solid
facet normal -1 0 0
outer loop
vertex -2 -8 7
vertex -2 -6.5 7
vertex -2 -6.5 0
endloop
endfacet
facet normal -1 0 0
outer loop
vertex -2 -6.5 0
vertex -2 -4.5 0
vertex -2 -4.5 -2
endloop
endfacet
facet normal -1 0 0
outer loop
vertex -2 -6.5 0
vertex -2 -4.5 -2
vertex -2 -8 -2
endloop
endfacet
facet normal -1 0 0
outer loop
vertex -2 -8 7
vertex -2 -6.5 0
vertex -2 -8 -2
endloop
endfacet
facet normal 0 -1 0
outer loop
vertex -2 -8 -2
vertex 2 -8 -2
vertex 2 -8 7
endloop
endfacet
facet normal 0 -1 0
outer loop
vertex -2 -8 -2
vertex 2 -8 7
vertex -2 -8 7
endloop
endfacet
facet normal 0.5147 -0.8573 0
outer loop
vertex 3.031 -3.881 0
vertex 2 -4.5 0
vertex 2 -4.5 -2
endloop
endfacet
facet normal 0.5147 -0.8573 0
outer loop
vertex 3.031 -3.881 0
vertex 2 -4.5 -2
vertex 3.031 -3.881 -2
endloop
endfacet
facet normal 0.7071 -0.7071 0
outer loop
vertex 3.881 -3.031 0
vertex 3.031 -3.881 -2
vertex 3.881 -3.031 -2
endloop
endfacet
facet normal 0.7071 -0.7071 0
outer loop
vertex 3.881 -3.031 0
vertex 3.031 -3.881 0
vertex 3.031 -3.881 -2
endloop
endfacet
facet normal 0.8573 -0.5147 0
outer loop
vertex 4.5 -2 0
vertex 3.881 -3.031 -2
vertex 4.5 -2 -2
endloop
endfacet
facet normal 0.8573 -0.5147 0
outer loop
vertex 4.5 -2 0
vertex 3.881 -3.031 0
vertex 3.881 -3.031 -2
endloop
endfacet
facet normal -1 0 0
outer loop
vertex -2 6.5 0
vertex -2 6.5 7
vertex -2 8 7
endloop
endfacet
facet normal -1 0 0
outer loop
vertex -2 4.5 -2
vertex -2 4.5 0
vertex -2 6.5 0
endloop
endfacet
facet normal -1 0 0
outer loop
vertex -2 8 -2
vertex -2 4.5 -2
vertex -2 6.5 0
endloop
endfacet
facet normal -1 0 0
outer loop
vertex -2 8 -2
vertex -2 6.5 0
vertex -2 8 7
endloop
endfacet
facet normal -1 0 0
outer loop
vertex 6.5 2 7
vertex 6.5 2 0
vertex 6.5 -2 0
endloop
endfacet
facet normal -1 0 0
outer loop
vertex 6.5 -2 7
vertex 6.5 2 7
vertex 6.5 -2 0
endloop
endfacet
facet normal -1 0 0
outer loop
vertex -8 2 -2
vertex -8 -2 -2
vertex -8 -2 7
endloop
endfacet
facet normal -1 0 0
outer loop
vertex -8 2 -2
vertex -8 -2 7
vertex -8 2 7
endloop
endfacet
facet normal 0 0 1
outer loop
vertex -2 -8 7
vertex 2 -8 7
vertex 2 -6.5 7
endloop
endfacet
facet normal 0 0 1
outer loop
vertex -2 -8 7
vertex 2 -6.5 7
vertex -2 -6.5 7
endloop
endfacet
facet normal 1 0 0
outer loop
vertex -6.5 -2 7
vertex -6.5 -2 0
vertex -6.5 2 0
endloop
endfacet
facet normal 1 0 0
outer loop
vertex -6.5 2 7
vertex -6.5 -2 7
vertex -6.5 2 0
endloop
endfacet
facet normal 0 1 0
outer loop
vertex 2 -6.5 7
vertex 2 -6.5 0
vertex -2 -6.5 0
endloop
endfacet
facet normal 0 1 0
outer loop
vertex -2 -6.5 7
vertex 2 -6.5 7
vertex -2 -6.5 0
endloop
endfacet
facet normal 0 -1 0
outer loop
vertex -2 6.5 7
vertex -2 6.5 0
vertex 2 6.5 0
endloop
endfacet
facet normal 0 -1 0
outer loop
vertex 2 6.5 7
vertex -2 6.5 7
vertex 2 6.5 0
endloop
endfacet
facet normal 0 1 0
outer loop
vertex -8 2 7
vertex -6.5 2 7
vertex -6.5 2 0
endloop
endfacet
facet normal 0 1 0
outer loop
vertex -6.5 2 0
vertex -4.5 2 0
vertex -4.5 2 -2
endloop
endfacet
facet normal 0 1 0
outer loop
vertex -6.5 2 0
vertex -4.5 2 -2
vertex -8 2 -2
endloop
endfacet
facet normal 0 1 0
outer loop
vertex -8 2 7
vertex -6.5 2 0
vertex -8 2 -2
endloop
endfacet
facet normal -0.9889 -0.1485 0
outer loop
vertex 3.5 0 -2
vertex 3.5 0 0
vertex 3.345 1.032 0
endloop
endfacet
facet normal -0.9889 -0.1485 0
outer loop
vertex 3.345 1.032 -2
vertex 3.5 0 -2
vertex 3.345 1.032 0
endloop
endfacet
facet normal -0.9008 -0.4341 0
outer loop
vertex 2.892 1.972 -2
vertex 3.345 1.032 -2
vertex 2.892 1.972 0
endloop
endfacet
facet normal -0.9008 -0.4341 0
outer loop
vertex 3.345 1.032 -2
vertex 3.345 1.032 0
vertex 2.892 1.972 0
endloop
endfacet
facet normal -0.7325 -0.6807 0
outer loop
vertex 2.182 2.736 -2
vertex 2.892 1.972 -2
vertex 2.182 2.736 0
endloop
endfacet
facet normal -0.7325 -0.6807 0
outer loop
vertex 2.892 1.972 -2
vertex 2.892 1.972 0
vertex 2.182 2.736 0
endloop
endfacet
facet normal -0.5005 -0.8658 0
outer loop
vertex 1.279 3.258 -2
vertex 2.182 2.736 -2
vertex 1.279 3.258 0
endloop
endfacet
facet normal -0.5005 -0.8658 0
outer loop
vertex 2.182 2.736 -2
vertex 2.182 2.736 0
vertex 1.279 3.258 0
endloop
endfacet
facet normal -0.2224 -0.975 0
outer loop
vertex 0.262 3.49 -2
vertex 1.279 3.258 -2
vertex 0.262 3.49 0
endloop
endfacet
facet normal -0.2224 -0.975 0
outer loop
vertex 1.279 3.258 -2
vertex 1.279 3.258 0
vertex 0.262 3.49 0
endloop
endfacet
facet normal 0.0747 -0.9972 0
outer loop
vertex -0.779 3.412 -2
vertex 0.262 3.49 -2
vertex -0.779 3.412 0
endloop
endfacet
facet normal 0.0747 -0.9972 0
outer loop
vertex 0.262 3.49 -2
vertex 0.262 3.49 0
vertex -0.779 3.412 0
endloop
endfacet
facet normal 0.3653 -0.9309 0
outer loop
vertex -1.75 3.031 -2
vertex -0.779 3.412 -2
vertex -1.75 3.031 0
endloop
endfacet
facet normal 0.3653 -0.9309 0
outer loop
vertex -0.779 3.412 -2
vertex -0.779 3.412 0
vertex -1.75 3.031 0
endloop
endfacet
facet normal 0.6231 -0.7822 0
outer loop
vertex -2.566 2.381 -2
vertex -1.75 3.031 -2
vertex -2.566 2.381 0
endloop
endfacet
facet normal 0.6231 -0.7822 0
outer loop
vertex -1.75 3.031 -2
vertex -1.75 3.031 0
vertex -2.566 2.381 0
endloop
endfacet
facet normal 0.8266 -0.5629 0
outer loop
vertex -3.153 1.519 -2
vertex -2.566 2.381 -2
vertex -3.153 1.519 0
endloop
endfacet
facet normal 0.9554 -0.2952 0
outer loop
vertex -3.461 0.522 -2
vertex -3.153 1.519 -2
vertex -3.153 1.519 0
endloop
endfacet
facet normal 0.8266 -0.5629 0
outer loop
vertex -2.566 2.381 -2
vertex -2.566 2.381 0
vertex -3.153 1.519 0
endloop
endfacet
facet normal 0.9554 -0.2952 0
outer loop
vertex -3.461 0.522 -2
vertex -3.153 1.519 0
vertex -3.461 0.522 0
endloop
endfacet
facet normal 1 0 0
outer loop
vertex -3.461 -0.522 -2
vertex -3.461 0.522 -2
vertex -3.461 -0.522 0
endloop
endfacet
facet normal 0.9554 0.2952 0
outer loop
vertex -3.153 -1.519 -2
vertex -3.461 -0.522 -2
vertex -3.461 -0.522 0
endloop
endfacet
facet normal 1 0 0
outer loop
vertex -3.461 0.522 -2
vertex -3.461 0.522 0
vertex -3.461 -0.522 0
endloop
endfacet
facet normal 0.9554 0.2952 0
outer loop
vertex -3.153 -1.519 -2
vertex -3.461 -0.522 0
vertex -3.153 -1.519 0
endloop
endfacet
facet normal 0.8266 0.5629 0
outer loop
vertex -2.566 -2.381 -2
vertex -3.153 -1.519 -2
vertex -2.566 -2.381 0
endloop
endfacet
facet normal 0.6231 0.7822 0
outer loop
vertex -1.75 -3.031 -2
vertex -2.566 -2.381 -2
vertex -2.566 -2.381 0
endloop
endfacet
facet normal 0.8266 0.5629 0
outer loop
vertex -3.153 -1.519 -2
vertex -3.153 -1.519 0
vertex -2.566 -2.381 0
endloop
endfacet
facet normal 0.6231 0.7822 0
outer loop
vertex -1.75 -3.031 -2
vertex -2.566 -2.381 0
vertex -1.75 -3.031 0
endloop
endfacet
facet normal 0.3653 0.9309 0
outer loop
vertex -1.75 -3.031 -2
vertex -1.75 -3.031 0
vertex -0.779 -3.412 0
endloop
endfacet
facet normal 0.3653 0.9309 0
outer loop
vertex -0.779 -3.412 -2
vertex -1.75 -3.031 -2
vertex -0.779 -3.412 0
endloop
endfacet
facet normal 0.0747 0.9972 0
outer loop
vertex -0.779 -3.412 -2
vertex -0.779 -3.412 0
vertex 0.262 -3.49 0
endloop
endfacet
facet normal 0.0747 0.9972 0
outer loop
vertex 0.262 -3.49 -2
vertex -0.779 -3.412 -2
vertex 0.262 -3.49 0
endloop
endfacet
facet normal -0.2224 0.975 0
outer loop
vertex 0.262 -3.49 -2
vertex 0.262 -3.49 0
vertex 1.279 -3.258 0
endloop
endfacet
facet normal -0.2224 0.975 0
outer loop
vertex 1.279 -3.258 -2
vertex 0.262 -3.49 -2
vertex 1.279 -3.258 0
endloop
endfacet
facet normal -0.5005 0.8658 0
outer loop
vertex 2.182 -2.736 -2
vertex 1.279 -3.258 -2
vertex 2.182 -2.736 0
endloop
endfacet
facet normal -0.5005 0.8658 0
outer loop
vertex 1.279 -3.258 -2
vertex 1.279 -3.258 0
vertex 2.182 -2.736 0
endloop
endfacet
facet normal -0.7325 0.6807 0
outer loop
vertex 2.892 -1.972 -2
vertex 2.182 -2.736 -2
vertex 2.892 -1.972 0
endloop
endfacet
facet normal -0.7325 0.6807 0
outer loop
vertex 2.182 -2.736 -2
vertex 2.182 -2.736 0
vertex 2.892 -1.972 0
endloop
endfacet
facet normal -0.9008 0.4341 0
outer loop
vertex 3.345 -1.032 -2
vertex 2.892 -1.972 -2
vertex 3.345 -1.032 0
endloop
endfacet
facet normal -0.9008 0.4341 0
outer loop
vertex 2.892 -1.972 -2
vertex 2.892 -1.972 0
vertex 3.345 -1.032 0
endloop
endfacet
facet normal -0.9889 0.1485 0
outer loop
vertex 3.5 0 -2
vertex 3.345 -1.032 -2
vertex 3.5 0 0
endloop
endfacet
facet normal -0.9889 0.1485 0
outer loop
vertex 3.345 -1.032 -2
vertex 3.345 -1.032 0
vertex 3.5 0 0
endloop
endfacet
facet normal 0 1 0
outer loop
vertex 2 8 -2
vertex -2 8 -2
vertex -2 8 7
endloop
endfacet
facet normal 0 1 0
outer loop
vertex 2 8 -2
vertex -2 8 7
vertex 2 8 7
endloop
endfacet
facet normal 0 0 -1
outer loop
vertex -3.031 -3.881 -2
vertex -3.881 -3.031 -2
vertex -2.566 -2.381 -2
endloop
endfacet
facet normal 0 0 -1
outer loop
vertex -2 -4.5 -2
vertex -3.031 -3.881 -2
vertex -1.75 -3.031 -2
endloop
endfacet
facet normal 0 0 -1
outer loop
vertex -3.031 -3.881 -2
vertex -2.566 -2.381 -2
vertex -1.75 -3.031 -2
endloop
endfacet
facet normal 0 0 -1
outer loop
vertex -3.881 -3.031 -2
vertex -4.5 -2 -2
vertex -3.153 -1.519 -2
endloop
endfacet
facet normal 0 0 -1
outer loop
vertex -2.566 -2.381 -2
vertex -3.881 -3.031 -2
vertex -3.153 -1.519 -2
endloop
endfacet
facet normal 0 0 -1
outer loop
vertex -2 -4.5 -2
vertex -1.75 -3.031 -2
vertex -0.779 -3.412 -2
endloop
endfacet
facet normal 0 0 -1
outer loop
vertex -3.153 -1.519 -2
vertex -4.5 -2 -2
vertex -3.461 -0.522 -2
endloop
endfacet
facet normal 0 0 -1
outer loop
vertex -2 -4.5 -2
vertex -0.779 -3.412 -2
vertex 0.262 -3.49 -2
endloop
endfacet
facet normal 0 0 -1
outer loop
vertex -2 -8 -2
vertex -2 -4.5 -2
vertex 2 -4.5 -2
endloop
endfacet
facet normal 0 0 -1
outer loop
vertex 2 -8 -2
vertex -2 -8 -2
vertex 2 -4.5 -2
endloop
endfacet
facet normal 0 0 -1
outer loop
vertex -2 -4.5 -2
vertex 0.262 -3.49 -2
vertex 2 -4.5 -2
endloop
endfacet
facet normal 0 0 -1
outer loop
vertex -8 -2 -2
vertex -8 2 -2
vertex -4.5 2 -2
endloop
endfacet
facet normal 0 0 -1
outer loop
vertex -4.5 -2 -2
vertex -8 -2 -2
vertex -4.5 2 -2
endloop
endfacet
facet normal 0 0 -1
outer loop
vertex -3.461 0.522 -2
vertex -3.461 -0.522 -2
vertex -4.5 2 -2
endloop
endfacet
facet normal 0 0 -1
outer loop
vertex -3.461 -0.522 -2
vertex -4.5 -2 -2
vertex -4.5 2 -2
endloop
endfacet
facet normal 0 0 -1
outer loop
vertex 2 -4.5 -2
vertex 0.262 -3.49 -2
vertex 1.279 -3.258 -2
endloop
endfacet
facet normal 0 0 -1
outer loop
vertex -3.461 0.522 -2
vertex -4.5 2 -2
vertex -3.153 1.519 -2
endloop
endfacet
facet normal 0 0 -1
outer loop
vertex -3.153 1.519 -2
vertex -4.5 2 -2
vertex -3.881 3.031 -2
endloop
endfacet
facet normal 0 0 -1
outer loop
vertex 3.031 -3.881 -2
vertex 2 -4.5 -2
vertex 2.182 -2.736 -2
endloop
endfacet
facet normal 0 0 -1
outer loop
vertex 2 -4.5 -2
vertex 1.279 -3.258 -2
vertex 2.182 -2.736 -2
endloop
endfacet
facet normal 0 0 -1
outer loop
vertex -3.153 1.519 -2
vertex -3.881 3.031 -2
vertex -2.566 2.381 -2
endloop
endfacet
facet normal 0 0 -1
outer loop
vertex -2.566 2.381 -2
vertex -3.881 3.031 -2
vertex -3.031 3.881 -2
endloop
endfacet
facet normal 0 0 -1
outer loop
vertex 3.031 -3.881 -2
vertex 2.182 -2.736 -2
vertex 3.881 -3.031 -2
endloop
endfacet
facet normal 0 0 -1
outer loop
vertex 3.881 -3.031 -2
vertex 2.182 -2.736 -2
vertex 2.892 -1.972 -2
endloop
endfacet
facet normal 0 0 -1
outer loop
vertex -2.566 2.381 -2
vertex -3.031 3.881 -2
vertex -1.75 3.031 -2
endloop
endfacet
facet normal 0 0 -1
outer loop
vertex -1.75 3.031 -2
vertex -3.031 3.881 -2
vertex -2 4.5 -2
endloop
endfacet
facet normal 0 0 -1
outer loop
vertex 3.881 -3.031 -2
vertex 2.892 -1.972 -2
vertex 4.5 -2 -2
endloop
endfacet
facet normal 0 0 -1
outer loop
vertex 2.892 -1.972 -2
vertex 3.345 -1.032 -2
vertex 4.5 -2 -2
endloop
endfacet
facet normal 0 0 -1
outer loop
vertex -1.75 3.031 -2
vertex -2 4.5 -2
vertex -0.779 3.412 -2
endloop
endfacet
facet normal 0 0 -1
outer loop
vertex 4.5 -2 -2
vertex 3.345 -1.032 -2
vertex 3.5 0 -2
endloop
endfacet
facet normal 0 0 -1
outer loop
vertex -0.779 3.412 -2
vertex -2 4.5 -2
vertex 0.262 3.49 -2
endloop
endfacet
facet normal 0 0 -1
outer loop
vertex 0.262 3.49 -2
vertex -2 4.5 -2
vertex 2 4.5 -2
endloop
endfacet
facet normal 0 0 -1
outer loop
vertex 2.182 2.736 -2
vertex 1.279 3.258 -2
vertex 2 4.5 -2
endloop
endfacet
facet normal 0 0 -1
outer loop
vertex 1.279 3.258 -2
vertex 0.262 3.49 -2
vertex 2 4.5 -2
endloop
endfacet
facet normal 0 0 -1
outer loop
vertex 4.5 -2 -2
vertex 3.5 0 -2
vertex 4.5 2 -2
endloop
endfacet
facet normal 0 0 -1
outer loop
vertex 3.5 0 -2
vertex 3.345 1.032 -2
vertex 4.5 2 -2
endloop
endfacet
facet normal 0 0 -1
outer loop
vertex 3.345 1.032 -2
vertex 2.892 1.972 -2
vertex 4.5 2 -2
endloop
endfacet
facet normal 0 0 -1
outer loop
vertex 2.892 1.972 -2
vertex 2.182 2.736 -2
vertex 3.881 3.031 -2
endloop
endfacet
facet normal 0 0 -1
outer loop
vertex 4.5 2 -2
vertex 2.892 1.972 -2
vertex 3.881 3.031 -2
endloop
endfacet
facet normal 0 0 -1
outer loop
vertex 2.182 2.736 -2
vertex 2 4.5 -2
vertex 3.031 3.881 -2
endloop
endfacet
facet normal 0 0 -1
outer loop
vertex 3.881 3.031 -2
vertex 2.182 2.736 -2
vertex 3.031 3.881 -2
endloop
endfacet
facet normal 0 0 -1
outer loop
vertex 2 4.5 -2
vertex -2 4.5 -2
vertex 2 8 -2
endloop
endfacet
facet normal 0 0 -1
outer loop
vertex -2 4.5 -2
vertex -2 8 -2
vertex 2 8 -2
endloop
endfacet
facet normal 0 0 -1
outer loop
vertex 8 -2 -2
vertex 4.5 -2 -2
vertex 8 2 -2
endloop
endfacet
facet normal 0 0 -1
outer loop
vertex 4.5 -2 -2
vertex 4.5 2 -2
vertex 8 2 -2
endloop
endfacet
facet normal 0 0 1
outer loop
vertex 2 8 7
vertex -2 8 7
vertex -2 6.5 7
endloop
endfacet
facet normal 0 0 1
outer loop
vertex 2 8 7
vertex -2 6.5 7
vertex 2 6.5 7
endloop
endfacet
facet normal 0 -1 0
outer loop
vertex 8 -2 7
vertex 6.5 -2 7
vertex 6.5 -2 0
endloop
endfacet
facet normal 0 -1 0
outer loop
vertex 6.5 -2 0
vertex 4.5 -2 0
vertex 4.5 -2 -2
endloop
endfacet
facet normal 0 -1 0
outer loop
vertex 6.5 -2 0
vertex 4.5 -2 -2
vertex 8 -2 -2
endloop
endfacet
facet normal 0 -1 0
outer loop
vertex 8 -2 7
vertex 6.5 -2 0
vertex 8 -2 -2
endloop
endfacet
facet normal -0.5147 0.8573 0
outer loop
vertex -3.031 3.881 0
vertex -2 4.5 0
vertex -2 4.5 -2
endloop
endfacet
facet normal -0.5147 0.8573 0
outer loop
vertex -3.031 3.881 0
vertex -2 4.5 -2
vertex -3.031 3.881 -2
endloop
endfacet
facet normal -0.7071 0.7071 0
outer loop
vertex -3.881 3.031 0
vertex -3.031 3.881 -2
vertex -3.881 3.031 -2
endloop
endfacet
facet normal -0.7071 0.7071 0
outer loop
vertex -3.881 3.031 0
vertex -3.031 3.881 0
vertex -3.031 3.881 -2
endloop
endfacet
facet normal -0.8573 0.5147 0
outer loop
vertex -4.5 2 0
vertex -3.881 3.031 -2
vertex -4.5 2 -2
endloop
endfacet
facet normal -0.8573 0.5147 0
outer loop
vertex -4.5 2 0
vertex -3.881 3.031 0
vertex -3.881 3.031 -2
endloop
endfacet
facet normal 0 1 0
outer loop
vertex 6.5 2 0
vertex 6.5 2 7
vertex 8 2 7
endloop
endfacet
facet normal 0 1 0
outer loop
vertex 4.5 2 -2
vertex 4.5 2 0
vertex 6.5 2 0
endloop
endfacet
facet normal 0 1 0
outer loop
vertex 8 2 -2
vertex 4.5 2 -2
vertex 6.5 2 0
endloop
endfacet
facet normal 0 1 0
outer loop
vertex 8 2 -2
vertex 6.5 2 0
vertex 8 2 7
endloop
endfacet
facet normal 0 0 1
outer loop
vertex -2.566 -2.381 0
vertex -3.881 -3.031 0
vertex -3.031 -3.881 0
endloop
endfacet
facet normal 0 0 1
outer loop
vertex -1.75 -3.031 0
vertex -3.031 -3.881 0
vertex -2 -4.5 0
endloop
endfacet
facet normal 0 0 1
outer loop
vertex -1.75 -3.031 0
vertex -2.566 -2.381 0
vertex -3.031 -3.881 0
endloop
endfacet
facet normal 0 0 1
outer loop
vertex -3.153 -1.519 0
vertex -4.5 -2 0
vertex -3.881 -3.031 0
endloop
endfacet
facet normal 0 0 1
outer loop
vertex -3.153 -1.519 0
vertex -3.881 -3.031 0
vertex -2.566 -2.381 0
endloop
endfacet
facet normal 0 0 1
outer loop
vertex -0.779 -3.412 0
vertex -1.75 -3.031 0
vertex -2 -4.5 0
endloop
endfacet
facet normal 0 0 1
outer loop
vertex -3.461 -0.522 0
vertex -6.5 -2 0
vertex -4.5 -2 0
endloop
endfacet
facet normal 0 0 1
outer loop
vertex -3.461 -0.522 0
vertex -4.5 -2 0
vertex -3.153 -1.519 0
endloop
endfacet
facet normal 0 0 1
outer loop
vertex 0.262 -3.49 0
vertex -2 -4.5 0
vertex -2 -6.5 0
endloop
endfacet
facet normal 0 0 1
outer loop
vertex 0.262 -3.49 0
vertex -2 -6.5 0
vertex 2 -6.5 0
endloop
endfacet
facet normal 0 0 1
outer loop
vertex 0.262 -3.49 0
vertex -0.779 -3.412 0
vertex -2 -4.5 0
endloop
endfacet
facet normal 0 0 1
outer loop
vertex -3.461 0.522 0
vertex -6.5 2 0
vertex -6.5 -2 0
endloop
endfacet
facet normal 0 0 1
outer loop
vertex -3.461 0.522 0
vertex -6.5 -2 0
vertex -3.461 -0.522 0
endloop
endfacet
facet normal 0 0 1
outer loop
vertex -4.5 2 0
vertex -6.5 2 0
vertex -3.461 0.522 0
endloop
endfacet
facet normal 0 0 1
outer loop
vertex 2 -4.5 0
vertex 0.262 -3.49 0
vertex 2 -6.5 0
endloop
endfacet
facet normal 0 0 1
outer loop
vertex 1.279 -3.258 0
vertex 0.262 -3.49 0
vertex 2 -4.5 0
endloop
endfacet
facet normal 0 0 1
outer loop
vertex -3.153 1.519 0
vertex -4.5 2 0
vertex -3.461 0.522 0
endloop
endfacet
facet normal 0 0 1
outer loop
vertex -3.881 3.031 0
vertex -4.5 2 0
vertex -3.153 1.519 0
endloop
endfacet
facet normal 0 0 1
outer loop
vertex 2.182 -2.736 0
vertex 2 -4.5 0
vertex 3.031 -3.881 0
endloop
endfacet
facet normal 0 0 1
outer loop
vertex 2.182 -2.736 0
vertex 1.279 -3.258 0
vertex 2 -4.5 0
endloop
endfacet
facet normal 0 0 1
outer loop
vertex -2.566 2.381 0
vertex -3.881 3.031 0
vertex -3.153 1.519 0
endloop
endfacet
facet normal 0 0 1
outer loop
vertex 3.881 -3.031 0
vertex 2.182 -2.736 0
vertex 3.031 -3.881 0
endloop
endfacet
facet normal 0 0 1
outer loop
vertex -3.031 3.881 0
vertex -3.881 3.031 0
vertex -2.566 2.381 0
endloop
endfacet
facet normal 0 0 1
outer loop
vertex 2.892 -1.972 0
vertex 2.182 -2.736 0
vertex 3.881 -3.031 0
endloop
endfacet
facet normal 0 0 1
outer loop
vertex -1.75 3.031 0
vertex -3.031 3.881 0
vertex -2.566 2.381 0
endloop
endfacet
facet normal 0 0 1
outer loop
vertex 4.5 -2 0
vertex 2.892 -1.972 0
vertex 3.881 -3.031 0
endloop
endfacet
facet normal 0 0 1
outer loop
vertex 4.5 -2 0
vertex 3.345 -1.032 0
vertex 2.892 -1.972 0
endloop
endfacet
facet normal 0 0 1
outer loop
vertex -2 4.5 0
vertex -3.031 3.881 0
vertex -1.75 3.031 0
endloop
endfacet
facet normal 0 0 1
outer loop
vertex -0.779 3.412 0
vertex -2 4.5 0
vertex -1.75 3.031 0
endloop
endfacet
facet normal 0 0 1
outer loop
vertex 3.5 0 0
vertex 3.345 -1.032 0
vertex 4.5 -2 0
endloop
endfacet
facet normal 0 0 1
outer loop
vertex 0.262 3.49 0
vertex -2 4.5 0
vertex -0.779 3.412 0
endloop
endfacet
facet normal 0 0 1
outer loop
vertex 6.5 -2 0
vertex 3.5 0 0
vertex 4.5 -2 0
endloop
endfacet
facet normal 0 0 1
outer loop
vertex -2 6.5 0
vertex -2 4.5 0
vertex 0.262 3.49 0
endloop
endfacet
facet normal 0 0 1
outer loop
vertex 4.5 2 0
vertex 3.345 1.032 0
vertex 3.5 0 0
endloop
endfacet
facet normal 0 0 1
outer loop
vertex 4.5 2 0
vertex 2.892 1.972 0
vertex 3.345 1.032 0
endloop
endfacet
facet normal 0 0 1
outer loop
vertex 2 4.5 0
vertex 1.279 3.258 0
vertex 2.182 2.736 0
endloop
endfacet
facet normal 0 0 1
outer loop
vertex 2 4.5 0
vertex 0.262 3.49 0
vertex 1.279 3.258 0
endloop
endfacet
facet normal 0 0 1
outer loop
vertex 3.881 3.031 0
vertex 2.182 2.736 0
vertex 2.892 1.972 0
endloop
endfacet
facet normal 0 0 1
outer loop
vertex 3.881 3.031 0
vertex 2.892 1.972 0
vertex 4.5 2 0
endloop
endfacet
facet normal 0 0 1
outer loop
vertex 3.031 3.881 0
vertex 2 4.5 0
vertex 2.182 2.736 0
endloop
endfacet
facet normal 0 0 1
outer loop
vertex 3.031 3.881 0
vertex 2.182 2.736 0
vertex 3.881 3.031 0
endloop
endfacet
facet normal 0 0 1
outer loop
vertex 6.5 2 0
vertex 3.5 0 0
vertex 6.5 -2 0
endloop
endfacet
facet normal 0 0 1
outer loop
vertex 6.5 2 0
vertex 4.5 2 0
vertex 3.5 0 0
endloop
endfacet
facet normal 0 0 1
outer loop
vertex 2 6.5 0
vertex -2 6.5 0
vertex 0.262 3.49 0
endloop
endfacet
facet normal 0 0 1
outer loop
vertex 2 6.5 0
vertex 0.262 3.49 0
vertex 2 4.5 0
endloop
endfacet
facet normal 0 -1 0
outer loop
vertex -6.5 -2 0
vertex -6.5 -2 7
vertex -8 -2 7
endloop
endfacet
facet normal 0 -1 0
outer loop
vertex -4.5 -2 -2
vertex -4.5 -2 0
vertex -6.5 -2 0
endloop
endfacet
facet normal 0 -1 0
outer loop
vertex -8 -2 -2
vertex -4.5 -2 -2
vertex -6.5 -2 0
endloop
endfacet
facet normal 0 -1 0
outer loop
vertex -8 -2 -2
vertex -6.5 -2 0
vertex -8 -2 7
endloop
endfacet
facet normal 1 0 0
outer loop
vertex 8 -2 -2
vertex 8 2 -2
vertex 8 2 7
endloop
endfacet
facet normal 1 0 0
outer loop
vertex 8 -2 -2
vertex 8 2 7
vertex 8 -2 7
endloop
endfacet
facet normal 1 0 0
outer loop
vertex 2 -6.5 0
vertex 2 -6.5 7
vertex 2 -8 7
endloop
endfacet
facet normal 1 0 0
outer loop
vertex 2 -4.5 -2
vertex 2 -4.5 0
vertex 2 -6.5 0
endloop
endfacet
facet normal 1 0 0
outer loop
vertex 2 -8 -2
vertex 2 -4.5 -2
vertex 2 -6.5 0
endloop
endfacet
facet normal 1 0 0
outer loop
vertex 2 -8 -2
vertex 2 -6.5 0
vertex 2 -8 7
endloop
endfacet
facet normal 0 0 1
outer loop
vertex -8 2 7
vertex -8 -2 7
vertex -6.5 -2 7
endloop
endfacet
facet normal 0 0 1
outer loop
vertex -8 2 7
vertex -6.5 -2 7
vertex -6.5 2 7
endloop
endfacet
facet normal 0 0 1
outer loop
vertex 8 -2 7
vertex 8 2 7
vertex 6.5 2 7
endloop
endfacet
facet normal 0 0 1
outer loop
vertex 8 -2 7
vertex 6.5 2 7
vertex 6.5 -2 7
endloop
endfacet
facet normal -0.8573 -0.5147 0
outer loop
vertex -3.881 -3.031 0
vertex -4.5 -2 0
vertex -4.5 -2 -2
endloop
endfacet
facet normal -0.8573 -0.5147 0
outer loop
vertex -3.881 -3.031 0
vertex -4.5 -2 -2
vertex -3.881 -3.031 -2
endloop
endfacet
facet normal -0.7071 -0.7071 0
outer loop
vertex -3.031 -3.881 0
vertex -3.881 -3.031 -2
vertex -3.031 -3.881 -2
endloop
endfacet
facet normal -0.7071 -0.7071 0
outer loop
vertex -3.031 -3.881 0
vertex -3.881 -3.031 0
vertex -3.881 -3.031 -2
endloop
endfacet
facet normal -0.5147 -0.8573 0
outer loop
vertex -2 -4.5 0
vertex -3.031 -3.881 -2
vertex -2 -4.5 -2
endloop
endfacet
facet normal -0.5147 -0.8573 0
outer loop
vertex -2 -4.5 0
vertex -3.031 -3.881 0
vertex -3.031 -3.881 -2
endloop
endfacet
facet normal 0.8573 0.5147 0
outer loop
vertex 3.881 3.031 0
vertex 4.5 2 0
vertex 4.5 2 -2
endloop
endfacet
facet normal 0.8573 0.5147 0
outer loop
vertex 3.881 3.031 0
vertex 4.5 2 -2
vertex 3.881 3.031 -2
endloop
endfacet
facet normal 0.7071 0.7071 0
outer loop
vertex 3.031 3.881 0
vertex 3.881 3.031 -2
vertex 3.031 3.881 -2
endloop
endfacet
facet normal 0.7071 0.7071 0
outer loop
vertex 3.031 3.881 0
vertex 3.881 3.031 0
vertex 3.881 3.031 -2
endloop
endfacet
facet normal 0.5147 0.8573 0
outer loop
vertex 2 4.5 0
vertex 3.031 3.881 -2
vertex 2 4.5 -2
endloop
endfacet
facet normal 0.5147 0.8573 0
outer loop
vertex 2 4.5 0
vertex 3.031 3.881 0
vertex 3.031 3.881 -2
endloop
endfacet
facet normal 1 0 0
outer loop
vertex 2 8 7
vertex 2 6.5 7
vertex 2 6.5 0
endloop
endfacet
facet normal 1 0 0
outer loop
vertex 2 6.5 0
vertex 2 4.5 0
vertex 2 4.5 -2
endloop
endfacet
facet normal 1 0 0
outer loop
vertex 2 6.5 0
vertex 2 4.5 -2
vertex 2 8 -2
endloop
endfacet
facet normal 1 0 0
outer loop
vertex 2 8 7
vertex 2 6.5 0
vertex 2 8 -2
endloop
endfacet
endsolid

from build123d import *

# Parameters (mm, degrees)
SKETCH_R           = 3.5
PAD_DEPTH          = 2
SKETCH001_W        = 4
SKETCH001_H        = 1.5
PAD001_DEPTH       = 7
POLARPATTERN_COUNT = 4


with BuildPart() as part:
    # Sketch → Pad (new body)
    with BuildSketch(Plane.XY):
        with BuildLine():
            Line((-8, 2), (-8, -2))
            Line((-8, -2), (-4.5, -2))
            ThreePointArc((-4.5, -2), (-3.482097, -3.482097), (-2, -4.5))
            Line((-2, -8), (-2, -4.5))
            Line((-2, -8), (2, -8))
            Line((2, -8), (2, -4.5))
            ThreePointArc((2, -4.5), (3.482097, -3.482097), (4.5, -2))
            Line((8, -2), (4.5, -2))
            Line((8, -2), (8, 2))
            Line((8, 2), (4.5, 2))
            ThreePointArc((4.5, 2), (3.482097, 3.482097), (2, 4.5))
            Line((2, 8), (2, 4.5))
            Line((2, 8), (-2, 8))
            Line((-2, 8), (-2, 4.5))
            ThreePointArc((-2, 4.5), (-3.482097, 3.482097), (-4.5, 2))
            Line((-8, 2), (-4.5, 2))
        make_face()
        Circle(SKETCH_R, mode=Mode.SUBTRACT)
    extrude(amount=-PAD_DEPTH)

    # Sketch001 → Pad001 (join)
    with BuildSketch(Plane.XY):
        with Locations((0, 7.25)):
            Rectangle(SKETCH001_W, SKETCH001_H)
    pad001 = extrude(amount=PAD001_DEPTH)

    # PolarPattern: Pad001 ×4 about axis
    polarpattern_axis = Axis((0, 0, 0), (0, 0, 1))
    for i in range(1, POLARPATTERN_COUNT):
        add(pad001.rotate(polarpattern_axis, i * 360 / POLARPATTERN_COUNT))


solid = part.part
